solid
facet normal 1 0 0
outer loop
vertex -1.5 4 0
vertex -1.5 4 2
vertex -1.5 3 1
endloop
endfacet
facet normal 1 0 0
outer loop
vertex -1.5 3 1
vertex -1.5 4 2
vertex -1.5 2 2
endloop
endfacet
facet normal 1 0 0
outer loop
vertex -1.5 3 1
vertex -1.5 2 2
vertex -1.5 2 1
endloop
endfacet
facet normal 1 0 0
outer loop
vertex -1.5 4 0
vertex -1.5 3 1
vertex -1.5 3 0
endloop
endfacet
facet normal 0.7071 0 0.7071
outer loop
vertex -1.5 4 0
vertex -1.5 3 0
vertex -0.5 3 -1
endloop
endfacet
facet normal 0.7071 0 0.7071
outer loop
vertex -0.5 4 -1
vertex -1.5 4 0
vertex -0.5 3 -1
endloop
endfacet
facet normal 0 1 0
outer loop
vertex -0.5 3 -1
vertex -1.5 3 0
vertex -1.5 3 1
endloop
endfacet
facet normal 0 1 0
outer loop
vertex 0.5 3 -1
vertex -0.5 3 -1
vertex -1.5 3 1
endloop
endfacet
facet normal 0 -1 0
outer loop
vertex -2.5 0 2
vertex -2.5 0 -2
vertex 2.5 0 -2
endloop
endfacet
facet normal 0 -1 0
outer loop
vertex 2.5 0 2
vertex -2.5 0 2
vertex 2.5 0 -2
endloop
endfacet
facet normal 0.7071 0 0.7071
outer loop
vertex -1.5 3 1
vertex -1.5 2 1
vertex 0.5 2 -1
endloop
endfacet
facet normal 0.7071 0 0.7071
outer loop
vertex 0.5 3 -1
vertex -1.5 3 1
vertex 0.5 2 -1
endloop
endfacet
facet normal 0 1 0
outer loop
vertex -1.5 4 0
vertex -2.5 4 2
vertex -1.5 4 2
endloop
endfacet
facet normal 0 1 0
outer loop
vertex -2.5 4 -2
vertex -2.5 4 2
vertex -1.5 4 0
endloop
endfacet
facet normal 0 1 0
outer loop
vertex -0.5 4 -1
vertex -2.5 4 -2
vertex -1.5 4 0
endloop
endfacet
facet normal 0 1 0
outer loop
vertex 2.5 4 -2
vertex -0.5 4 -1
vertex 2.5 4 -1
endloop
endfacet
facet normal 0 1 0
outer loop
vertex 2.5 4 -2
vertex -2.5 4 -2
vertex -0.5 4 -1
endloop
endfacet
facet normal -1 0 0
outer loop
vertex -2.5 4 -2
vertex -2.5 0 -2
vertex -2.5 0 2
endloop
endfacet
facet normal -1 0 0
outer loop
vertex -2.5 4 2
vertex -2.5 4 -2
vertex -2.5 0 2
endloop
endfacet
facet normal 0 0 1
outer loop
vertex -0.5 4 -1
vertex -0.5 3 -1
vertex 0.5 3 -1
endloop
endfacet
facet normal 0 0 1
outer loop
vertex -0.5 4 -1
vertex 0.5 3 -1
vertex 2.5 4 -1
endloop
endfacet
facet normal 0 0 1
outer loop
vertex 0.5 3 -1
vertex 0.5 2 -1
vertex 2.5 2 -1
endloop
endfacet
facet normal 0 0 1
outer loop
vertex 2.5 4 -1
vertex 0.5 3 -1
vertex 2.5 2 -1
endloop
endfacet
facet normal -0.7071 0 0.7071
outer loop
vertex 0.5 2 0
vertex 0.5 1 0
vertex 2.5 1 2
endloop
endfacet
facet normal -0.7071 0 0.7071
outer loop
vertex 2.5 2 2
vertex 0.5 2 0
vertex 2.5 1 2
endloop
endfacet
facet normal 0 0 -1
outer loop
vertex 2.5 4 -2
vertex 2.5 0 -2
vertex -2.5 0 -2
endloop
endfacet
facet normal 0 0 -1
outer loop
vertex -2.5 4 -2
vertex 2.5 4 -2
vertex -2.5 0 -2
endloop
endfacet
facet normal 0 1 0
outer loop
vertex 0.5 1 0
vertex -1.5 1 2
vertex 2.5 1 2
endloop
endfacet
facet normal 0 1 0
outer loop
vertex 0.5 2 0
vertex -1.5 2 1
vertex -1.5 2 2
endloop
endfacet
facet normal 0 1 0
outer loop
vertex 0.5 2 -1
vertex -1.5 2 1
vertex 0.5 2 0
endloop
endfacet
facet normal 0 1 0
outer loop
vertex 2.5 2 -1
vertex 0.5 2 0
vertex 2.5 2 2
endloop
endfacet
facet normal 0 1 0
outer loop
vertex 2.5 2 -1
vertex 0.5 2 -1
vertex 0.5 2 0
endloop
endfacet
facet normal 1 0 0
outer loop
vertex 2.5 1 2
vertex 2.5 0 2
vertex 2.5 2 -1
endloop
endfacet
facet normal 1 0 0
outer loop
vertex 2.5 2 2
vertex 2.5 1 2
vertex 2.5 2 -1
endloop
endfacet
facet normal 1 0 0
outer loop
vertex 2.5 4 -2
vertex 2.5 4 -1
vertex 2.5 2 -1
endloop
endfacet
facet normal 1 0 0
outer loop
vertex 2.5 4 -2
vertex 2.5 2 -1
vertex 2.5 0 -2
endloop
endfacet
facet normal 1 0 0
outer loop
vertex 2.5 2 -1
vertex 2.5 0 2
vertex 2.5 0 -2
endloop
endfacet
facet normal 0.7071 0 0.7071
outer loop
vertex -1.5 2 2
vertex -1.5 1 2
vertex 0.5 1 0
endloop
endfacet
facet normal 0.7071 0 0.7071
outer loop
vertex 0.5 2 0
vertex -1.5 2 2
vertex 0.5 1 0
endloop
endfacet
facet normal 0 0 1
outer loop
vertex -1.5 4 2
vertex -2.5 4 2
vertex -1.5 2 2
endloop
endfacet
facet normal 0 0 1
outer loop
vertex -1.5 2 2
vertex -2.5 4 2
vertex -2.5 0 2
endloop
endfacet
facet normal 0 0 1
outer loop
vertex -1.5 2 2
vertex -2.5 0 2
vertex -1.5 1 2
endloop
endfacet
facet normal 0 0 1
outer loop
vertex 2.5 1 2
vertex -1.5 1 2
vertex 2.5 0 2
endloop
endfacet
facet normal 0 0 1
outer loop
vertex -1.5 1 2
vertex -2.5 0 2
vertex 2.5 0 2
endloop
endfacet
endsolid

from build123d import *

# Parameters (mm, degrees)
EXTRUDE_2_DEPTH = 4
EXTRUDE_3_DEPTH = 3
EXTRUDE_4_DEPTH = 2
EXTRUDE_5_DEPTH = 1


with BuildPart() as part:
    # 草圖1 → 填料-伸長2 (new body)
    with BuildSketch(Plane(origin=(0, 0, 0), x_dir=(1, 0, 0), z_dir=(0, 1, 0))):
        Polygon((-2.5, -2), (-1.5, -2), (-1.5, 0), (-0.5, 1), (2.5, 1), (2.5, 2), (-2.5, 2), align=None)
    extrude(amount=EXTRUDE_2_DEPTH)

    # 草圖1<4> → 填料-伸長3 (add)
    with BuildSketch(Plane(origin=(0, 0, 0), x_dir=(1, 0, 0), z_dir=(0, 1, 0))):
        Polygon((-1.5, 0), (-1.5, -1), (0.5, 1), (-0.5, 1), align=None)
    extrude(amount=EXTRUDE_3_DEPTH)

    # 草圖1<5> → 填料-伸長4 (add)
    with BuildSketch(Plane(origin=(0, 0, 0), x_dir=(1, 0, 0), z_dir=(0, 1, 0))):
        Polygon((-1.5, -1), (-1.5, -2), (0.5, 0), (2.5, -2), (2.5, 1), (0.5, 1), align=None)
    extrude(amount=EXTRUDE_4_DEPTH)

    # 草圖1<6> → 填料-伸長5 (add)
    with BuildSketch(Plane(origin=(0, 0, 0), x_dir=(1, 0, 0), z_dir=(0, 1, 0))):
        Polygon((0.5, 0), (-1.5, -2), (2.5, -2), align=None)
    extrude(amount=EXTRUDE_5_DEPTH)


solid = part.part
